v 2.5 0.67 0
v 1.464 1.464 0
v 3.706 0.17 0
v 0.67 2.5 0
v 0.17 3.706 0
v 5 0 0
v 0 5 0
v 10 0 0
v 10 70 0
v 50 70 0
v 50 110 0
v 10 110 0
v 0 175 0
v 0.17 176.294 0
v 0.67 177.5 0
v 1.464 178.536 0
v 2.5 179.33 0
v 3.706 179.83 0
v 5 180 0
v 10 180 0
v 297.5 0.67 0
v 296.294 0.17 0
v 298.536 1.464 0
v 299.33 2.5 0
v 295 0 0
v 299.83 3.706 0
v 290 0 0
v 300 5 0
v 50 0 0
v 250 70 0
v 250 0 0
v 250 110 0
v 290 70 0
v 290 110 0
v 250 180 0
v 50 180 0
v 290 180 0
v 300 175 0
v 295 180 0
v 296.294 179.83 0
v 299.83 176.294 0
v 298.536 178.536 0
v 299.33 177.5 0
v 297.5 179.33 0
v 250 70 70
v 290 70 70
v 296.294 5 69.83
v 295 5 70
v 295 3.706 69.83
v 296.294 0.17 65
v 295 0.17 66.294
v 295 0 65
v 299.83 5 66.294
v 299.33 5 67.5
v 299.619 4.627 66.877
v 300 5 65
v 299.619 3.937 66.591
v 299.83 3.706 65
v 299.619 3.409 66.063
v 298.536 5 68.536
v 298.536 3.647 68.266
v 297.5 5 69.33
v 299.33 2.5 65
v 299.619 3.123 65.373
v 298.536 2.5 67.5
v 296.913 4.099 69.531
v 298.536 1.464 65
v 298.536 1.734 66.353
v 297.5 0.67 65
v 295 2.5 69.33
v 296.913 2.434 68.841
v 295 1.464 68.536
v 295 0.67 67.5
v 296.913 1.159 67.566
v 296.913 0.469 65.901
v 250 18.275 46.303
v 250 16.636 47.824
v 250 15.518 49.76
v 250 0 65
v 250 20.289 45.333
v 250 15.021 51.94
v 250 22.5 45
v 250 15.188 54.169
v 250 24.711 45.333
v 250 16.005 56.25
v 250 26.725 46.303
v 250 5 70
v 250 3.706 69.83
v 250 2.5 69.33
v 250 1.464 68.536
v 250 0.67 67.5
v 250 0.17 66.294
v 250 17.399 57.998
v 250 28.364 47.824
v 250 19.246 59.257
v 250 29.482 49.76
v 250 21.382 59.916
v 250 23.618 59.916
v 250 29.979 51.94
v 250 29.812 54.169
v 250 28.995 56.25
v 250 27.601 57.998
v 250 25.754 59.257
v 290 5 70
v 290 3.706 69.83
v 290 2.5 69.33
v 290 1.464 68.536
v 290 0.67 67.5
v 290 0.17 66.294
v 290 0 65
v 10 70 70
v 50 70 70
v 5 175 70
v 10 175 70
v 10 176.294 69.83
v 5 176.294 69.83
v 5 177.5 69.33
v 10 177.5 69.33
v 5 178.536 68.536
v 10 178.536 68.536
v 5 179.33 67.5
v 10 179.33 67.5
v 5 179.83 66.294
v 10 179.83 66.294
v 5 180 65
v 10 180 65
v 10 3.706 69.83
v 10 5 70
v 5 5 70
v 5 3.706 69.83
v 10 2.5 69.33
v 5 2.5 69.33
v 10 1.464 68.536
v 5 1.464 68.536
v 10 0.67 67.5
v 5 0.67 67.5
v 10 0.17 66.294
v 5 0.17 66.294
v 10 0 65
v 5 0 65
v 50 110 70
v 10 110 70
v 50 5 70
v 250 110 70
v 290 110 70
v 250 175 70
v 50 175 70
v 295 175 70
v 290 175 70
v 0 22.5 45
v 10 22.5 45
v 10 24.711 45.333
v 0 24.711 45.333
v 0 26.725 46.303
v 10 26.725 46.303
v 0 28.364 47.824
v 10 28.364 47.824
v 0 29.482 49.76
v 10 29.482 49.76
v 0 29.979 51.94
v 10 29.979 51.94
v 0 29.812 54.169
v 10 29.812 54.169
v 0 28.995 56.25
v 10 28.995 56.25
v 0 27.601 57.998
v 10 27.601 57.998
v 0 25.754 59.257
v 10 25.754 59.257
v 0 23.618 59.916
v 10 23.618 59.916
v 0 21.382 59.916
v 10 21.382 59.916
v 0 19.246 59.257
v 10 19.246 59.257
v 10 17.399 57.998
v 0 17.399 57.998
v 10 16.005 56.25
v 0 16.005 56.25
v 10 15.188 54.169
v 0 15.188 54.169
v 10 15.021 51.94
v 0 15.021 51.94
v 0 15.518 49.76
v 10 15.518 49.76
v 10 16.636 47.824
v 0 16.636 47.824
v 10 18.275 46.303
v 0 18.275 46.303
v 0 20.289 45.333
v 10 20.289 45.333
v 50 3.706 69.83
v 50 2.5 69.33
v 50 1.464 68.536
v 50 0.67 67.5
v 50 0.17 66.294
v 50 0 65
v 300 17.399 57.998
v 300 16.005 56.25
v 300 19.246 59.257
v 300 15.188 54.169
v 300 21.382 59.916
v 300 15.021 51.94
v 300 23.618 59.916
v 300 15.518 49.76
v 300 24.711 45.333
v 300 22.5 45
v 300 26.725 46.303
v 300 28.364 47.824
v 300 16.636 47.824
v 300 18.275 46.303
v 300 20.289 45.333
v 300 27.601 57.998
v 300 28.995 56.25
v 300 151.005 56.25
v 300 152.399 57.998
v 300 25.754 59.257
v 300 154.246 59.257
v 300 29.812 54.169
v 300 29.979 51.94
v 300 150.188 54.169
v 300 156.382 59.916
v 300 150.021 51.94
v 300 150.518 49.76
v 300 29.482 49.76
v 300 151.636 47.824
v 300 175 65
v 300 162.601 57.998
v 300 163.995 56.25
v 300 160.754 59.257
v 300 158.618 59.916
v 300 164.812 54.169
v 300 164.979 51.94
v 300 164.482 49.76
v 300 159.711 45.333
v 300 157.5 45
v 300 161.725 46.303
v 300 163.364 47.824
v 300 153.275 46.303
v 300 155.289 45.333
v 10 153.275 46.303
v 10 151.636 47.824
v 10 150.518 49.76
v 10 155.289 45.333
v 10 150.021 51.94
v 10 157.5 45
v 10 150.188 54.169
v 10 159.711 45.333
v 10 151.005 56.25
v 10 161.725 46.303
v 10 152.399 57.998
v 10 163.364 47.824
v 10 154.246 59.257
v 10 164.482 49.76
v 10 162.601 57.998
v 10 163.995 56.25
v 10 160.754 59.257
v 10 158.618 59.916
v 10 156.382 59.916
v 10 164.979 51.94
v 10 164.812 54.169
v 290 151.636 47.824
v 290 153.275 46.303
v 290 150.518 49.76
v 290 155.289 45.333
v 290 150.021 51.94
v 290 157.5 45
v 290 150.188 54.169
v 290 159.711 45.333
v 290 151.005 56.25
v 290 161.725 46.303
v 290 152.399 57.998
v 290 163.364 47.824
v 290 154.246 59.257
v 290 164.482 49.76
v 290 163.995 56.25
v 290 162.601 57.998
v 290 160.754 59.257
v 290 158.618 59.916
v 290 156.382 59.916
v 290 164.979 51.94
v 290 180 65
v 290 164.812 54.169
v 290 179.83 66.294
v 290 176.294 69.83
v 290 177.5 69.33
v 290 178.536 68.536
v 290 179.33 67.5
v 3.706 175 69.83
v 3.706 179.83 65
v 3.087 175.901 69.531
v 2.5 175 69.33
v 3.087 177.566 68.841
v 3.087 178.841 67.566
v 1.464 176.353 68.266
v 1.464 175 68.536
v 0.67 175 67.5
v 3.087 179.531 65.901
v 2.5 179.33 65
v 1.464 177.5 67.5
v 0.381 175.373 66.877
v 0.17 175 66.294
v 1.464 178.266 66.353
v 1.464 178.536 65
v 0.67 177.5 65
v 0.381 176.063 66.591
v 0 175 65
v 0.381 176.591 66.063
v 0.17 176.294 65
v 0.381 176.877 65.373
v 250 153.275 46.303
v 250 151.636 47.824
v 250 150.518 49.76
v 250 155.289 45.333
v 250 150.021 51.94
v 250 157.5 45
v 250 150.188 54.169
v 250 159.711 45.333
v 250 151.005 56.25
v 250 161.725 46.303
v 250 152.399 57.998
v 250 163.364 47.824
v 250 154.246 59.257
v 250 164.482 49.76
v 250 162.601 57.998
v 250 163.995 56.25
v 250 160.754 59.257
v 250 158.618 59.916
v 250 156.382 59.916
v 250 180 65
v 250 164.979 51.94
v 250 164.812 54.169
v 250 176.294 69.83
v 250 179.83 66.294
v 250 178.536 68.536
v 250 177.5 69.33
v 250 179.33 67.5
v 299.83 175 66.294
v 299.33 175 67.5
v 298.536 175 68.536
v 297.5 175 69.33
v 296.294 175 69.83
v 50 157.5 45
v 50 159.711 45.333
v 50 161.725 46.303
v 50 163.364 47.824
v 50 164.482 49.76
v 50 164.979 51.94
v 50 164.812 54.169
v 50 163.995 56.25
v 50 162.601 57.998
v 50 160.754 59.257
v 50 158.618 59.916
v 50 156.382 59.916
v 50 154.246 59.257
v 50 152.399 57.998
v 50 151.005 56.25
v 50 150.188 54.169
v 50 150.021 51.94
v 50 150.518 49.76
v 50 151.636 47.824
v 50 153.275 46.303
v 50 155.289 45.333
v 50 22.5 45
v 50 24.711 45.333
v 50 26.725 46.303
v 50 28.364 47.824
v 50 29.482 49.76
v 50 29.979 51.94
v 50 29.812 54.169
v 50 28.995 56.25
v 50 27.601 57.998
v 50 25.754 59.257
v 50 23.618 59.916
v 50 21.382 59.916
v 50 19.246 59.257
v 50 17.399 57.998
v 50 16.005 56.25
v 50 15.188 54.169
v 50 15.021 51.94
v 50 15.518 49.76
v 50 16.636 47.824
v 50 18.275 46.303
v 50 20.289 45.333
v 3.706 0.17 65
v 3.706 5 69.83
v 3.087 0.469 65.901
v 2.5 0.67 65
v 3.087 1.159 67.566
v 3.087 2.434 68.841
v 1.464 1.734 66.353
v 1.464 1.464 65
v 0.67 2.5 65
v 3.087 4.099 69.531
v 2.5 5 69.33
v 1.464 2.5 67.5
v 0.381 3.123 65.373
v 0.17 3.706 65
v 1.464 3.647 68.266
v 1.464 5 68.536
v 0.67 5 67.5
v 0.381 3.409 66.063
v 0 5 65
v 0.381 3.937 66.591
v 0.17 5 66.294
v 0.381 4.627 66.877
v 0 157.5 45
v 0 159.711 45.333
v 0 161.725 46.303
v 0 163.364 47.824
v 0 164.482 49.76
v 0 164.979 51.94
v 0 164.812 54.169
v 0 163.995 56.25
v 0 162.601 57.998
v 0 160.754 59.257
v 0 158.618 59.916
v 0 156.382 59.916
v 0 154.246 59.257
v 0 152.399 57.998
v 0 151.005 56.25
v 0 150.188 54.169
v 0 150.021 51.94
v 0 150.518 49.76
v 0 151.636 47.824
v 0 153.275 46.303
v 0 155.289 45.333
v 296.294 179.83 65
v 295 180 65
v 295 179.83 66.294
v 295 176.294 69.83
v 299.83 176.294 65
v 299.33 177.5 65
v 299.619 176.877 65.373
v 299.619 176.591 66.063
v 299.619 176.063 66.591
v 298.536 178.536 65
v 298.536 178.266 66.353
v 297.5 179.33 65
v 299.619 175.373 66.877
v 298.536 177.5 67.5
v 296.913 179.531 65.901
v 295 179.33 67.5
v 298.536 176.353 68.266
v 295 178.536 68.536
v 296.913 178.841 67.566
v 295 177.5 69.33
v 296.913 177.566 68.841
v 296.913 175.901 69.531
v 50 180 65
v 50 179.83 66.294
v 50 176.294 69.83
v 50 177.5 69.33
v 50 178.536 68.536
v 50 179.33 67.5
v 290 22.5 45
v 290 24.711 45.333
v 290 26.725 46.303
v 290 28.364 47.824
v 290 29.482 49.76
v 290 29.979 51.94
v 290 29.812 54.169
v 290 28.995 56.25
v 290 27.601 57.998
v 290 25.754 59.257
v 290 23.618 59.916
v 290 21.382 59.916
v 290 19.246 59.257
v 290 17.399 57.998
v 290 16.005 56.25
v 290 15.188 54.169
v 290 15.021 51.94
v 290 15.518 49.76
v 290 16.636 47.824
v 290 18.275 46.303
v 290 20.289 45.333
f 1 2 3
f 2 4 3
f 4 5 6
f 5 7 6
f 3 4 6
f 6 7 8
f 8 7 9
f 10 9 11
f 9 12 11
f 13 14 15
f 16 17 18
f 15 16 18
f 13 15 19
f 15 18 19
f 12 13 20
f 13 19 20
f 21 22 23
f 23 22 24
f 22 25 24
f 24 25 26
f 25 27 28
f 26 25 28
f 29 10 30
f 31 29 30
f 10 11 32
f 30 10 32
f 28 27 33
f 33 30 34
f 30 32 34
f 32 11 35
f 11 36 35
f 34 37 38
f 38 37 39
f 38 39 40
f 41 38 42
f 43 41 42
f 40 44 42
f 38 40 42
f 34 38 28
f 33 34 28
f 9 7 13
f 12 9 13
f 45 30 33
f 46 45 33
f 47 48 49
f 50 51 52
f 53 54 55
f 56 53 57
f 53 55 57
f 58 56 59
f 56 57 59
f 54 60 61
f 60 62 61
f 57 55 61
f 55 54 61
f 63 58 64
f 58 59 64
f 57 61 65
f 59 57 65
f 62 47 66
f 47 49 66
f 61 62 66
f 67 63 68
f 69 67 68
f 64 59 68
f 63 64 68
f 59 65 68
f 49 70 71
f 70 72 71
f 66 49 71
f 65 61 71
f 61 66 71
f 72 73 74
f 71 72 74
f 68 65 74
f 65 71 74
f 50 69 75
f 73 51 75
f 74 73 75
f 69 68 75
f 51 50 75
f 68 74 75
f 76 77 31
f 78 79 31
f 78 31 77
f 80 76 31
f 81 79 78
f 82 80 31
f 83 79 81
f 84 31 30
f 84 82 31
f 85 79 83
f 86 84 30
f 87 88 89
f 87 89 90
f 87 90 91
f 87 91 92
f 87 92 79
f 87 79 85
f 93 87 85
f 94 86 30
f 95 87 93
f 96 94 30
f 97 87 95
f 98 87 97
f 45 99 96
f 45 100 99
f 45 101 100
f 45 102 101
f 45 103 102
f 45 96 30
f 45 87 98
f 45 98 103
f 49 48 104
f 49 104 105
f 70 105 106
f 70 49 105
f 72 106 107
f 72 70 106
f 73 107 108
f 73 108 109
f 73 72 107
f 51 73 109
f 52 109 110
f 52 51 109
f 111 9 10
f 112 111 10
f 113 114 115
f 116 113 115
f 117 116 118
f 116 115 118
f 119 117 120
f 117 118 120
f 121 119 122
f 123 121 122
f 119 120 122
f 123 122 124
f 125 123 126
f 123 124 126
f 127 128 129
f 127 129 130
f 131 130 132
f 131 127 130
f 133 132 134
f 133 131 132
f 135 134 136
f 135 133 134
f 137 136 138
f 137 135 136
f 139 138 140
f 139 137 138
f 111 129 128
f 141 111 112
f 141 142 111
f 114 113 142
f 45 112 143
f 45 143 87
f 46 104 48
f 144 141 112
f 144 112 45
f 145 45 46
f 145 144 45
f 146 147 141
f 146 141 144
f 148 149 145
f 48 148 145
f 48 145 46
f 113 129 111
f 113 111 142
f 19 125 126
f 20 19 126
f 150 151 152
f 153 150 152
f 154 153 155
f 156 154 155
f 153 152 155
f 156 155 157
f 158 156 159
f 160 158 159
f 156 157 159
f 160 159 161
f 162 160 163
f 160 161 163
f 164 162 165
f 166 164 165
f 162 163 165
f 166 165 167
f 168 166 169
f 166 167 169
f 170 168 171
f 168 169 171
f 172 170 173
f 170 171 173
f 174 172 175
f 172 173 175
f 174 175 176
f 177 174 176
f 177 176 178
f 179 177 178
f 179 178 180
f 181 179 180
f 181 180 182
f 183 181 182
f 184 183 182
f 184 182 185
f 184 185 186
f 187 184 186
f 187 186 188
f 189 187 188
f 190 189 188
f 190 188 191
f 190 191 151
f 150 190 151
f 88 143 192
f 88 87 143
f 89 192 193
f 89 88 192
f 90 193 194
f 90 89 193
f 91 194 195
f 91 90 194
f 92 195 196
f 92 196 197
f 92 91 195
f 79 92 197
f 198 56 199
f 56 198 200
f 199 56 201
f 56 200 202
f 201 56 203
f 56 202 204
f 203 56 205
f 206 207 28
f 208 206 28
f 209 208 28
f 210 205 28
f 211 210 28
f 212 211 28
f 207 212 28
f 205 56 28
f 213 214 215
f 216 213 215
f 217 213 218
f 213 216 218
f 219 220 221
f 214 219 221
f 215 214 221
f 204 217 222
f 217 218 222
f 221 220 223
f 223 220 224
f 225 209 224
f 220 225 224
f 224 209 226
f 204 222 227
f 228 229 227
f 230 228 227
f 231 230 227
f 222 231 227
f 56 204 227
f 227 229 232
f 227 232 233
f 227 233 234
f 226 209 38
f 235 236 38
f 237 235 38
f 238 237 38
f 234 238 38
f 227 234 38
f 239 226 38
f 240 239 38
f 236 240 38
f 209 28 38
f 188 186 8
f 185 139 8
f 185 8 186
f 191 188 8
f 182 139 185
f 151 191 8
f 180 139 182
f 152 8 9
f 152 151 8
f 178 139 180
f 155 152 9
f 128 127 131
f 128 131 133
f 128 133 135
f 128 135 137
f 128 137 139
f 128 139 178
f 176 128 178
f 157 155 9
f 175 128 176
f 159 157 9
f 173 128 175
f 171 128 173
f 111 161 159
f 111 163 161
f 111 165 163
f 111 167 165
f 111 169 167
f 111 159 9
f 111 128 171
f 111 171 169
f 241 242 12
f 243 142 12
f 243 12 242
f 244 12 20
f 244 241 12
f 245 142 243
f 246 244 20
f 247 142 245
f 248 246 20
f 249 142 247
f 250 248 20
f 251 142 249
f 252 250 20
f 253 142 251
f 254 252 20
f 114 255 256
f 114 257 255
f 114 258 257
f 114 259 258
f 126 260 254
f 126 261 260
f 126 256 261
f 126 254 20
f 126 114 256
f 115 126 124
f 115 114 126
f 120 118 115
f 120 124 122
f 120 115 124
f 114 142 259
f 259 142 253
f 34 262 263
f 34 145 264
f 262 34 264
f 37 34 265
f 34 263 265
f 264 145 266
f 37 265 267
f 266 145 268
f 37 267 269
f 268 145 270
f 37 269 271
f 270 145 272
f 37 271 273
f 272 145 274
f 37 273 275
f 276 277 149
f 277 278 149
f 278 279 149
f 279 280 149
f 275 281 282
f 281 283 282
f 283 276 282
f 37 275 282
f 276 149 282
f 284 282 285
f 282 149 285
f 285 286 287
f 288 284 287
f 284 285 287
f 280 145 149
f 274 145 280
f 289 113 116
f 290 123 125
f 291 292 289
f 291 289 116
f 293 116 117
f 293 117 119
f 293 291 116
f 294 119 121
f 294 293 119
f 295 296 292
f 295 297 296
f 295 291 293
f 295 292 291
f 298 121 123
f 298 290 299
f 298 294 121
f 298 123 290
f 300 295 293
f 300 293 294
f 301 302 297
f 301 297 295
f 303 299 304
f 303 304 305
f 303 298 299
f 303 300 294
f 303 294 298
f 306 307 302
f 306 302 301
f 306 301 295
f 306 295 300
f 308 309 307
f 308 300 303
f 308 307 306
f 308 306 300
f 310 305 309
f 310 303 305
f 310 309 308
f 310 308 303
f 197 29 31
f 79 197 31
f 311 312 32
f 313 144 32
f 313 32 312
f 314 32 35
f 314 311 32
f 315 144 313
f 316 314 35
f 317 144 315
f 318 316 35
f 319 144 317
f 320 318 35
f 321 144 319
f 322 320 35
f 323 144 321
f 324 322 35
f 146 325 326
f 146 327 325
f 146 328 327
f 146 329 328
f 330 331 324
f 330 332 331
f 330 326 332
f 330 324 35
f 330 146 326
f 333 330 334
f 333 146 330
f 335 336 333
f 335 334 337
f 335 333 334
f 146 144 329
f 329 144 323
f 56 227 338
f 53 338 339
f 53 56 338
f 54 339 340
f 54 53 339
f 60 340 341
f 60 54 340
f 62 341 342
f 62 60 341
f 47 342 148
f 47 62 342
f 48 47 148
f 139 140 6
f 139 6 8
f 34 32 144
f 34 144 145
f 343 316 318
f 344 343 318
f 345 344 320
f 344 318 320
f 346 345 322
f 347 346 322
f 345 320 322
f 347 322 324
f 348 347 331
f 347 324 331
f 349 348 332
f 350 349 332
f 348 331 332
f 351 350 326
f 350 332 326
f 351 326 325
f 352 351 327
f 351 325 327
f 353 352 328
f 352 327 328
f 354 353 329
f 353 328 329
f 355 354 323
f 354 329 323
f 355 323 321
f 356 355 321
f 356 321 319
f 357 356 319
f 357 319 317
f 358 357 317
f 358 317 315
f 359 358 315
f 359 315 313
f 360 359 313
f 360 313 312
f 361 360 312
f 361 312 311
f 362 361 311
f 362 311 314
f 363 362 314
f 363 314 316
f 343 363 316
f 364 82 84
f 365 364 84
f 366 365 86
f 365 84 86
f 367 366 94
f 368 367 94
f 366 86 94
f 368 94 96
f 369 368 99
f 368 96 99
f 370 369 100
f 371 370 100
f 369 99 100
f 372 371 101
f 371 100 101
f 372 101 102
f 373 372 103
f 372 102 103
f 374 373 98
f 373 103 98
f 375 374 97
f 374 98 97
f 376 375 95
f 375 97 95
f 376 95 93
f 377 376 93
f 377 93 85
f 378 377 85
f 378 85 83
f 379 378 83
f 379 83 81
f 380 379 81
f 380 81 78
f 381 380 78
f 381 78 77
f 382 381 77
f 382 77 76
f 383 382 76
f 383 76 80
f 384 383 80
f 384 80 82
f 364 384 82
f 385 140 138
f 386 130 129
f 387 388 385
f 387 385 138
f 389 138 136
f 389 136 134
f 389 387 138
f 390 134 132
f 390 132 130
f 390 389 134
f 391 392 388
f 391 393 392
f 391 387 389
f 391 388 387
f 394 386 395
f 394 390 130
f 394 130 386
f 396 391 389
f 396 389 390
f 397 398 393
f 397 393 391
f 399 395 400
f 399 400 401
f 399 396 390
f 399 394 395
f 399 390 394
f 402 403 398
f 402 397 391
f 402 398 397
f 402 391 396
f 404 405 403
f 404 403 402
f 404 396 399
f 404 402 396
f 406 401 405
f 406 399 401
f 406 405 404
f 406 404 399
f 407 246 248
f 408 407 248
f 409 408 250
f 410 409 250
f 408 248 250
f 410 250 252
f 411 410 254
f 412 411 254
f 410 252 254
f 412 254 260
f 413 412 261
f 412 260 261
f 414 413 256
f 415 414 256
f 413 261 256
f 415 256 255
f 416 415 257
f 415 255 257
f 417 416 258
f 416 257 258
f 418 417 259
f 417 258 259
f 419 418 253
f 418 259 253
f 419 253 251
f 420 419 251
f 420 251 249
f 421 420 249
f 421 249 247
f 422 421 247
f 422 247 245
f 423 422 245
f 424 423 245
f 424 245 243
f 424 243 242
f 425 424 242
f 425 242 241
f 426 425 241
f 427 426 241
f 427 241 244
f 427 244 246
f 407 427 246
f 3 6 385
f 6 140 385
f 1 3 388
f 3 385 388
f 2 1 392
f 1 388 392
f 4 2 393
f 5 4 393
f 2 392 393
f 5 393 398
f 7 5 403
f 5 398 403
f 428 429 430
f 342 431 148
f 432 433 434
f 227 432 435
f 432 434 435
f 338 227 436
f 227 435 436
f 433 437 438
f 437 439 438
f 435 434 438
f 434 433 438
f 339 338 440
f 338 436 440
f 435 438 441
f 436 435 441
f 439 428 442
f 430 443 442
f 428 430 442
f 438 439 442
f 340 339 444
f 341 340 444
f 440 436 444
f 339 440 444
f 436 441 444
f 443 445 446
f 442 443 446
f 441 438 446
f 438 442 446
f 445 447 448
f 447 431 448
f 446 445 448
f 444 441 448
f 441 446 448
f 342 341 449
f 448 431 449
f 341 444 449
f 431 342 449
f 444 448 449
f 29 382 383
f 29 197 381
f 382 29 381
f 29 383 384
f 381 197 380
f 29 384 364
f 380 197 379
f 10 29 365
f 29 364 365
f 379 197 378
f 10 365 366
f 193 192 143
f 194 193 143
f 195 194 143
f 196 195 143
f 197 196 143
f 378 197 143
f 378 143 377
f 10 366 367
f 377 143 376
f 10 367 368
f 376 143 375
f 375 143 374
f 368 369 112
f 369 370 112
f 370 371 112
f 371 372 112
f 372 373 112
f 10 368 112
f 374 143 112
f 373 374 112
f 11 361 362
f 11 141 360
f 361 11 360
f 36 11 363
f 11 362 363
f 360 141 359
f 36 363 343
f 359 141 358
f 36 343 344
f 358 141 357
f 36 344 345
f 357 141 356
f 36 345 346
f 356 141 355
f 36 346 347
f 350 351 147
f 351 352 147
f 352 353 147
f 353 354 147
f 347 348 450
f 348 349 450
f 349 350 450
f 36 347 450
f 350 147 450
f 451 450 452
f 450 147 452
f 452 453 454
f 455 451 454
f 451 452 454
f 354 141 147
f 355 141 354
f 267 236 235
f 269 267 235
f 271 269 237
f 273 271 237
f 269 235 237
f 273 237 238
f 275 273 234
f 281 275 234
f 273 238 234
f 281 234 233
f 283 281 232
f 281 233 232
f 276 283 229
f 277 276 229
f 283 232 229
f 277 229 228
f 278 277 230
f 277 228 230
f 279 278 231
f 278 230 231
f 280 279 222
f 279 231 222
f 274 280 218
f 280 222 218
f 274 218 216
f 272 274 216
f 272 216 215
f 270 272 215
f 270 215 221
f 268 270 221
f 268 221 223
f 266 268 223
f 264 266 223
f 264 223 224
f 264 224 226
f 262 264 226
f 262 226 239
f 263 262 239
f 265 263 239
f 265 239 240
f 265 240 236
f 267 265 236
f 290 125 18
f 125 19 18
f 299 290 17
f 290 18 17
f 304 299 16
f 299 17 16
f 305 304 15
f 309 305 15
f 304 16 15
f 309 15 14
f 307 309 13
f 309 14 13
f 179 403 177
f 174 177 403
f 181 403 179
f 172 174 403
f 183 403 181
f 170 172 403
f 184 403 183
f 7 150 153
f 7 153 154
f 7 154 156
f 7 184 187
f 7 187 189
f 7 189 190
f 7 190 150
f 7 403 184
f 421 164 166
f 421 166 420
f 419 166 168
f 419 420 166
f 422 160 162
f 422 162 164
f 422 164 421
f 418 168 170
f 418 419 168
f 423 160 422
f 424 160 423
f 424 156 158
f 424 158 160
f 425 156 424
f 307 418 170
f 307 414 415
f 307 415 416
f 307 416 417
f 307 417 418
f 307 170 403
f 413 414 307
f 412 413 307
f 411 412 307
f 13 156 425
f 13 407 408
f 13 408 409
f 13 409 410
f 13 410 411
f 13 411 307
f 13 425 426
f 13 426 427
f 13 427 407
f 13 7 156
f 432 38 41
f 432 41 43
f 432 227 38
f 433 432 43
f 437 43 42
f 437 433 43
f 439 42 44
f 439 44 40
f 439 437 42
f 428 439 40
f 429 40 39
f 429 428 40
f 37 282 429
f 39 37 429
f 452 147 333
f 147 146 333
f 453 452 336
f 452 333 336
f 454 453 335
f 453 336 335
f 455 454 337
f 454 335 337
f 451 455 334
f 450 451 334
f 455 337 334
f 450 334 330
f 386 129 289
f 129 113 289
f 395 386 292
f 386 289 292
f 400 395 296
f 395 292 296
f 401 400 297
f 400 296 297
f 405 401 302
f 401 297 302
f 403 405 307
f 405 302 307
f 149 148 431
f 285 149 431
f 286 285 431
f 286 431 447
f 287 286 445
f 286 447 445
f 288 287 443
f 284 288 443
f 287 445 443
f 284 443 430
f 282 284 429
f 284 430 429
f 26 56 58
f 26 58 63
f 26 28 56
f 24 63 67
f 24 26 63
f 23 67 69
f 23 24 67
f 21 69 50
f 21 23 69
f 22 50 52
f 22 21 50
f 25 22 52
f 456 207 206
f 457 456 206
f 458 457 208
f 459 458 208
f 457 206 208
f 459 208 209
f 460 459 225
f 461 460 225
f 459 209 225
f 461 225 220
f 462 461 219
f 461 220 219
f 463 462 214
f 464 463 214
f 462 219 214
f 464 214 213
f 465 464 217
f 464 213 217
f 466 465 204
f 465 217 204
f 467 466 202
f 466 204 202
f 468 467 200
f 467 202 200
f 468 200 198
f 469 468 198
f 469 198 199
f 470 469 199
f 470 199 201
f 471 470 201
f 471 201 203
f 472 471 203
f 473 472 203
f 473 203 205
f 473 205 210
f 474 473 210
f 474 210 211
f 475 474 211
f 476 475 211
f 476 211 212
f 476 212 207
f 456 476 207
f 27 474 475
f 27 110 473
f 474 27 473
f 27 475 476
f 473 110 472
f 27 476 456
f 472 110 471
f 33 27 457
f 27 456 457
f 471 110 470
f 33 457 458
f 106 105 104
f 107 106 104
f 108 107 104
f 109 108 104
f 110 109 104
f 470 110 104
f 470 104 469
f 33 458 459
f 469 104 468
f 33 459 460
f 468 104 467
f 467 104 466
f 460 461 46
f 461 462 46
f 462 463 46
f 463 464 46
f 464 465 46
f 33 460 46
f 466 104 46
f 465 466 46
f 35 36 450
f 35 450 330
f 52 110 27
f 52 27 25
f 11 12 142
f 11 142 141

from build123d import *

# Parameters (mm, degrees)
CROQUIS2_W              = 300
CROQUIS2_H              = 180
SALIENTE_EXTRUIR3_DEPTH = 70
CROQUIS3_W              = 40
CROQUIS3_H              = 70
CORTAR_EXTRUIR1_DEPTH   = 70
CROQUIS4_R              = 7.5
CORTAR_EXTRUIR2_DEPTH   = 400
REDONDEO2_R             = 5
REDONDEO3_R             = 5
REDONDEO4_R             = 5
REDONDEO5_R             = 5
REDONDEO6_R             = 5
REDONDEO7_R             = 5
REDONDEO8_R             = 5
REDONDEO9_R             = 5


with BuildPart() as part:
    # Croquis2 → Saliente-Extruir3 (new body)
    with BuildSketch(Plane.XY):
        with Locations((150, 90)):
            Rectangle(CROQUIS2_W, CROQUIS2_H)
    extrude(amount=SALIENTE_EXTRUIR3_DEPTH)

    # Croquis3 → Cortar-Extruir1 (cut)
    with BuildSketch(Plane.XY.offset(70)):
        with Locations((30, 145)):
            Rectangle(CROQUIS3_W, CROQUIS3_H)
        with Locations((270, 35)):
            Rectangle(CROQUIS3_W, CROQUIS3_H)
        with Locations((30, 35)):
            Rectangle(CROQUIS3_W, CROQUIS3_H)
        with Locations((270, 145)):
            Rectangle(CROQUIS3_W, CROQUIS3_H)
    extrude(amount=-CORTAR_EXTRUIR1_DEPTH, mode=Mode.SUBTRACT)

    # Croquis4 → Cortar-Extruir2 (cut)
    with BuildSketch(Plane(origin=(300, 0, 0), x_dir=(0, 0, -1), z_dir=(1, 0, 0))):
        with Locations((-52.5, 157.5)):
            Circle(CROQUIS4_R)
        with Locations((-52.5, 22.5)):
            Circle(CROQUIS4_R)
    extrude(amount=-CORTAR_EXTRUIR2_DEPTH, mode=Mode.SUBTRACT)

    # Redondeo2
    redondeo2_edges = [part.edges().sort_by_distance(p)[0] for p in [
        (150, 0, 70),
    ]]
    fillet(redondeo2_edges, radius=REDONDEO2_R)

    # Redondeo3
    redondeo3_edges = [part.edges().sort_by_distance(p)[0] for p in [
        (150, 180, 70),
    ]]
    fillet(redondeo3_edges, radius=REDONDEO3_R)

    # Redondeo4
    redondeo4_edges = [part.edges().sort_by_distance(p)[0] for p in [
        (5, 180, 70),
    ]]
    fillet(redondeo4_edges, radius=REDONDEO4_R)

    # Redondeo5
    redondeo5_edges = [part.edges().sort_by_distance(p)[0] for p in [
        (295, 180, 70),
    ]]
    fillet(redondeo5_edges, radius=REDONDEO5_R)

    # Redondeo6
    redondeo6_edges = [part.edges().sort_by_distance(p)[0] for p in [
        (295, 0, 70),
    ]]
    fillet(redondeo6_edges, radius=REDONDEO6_R)

    # Redondeo7
    redondeo7_edges = [part.edges().sort_by_distance(p)[0] for p in [
        (5, 0, 70),
    ]]
    fillet(redondeo7_edges, radius=REDONDEO7_R)

    # Redondeo8
    redondeo8_edges = [part.edges().sort_by_distance(p)[0] for p in [
        (0, 90, 70),
        (0, 180, 32.5),
        (0, 0, 32.5),
    ]]
    fillet(redondeo8_edges, radius=REDONDEO8_R)

    # Redondeo9
    redondeo9_edges = [part.edges().sort_by_distance(p)[0] for p in [
        (300, 180, 32.5),
        (300, 90, 70),
        (300, 0, 32.5),
    ]]
    fillet(redondeo9_edges, radius=REDONDEO9_R)


solid = part.part
